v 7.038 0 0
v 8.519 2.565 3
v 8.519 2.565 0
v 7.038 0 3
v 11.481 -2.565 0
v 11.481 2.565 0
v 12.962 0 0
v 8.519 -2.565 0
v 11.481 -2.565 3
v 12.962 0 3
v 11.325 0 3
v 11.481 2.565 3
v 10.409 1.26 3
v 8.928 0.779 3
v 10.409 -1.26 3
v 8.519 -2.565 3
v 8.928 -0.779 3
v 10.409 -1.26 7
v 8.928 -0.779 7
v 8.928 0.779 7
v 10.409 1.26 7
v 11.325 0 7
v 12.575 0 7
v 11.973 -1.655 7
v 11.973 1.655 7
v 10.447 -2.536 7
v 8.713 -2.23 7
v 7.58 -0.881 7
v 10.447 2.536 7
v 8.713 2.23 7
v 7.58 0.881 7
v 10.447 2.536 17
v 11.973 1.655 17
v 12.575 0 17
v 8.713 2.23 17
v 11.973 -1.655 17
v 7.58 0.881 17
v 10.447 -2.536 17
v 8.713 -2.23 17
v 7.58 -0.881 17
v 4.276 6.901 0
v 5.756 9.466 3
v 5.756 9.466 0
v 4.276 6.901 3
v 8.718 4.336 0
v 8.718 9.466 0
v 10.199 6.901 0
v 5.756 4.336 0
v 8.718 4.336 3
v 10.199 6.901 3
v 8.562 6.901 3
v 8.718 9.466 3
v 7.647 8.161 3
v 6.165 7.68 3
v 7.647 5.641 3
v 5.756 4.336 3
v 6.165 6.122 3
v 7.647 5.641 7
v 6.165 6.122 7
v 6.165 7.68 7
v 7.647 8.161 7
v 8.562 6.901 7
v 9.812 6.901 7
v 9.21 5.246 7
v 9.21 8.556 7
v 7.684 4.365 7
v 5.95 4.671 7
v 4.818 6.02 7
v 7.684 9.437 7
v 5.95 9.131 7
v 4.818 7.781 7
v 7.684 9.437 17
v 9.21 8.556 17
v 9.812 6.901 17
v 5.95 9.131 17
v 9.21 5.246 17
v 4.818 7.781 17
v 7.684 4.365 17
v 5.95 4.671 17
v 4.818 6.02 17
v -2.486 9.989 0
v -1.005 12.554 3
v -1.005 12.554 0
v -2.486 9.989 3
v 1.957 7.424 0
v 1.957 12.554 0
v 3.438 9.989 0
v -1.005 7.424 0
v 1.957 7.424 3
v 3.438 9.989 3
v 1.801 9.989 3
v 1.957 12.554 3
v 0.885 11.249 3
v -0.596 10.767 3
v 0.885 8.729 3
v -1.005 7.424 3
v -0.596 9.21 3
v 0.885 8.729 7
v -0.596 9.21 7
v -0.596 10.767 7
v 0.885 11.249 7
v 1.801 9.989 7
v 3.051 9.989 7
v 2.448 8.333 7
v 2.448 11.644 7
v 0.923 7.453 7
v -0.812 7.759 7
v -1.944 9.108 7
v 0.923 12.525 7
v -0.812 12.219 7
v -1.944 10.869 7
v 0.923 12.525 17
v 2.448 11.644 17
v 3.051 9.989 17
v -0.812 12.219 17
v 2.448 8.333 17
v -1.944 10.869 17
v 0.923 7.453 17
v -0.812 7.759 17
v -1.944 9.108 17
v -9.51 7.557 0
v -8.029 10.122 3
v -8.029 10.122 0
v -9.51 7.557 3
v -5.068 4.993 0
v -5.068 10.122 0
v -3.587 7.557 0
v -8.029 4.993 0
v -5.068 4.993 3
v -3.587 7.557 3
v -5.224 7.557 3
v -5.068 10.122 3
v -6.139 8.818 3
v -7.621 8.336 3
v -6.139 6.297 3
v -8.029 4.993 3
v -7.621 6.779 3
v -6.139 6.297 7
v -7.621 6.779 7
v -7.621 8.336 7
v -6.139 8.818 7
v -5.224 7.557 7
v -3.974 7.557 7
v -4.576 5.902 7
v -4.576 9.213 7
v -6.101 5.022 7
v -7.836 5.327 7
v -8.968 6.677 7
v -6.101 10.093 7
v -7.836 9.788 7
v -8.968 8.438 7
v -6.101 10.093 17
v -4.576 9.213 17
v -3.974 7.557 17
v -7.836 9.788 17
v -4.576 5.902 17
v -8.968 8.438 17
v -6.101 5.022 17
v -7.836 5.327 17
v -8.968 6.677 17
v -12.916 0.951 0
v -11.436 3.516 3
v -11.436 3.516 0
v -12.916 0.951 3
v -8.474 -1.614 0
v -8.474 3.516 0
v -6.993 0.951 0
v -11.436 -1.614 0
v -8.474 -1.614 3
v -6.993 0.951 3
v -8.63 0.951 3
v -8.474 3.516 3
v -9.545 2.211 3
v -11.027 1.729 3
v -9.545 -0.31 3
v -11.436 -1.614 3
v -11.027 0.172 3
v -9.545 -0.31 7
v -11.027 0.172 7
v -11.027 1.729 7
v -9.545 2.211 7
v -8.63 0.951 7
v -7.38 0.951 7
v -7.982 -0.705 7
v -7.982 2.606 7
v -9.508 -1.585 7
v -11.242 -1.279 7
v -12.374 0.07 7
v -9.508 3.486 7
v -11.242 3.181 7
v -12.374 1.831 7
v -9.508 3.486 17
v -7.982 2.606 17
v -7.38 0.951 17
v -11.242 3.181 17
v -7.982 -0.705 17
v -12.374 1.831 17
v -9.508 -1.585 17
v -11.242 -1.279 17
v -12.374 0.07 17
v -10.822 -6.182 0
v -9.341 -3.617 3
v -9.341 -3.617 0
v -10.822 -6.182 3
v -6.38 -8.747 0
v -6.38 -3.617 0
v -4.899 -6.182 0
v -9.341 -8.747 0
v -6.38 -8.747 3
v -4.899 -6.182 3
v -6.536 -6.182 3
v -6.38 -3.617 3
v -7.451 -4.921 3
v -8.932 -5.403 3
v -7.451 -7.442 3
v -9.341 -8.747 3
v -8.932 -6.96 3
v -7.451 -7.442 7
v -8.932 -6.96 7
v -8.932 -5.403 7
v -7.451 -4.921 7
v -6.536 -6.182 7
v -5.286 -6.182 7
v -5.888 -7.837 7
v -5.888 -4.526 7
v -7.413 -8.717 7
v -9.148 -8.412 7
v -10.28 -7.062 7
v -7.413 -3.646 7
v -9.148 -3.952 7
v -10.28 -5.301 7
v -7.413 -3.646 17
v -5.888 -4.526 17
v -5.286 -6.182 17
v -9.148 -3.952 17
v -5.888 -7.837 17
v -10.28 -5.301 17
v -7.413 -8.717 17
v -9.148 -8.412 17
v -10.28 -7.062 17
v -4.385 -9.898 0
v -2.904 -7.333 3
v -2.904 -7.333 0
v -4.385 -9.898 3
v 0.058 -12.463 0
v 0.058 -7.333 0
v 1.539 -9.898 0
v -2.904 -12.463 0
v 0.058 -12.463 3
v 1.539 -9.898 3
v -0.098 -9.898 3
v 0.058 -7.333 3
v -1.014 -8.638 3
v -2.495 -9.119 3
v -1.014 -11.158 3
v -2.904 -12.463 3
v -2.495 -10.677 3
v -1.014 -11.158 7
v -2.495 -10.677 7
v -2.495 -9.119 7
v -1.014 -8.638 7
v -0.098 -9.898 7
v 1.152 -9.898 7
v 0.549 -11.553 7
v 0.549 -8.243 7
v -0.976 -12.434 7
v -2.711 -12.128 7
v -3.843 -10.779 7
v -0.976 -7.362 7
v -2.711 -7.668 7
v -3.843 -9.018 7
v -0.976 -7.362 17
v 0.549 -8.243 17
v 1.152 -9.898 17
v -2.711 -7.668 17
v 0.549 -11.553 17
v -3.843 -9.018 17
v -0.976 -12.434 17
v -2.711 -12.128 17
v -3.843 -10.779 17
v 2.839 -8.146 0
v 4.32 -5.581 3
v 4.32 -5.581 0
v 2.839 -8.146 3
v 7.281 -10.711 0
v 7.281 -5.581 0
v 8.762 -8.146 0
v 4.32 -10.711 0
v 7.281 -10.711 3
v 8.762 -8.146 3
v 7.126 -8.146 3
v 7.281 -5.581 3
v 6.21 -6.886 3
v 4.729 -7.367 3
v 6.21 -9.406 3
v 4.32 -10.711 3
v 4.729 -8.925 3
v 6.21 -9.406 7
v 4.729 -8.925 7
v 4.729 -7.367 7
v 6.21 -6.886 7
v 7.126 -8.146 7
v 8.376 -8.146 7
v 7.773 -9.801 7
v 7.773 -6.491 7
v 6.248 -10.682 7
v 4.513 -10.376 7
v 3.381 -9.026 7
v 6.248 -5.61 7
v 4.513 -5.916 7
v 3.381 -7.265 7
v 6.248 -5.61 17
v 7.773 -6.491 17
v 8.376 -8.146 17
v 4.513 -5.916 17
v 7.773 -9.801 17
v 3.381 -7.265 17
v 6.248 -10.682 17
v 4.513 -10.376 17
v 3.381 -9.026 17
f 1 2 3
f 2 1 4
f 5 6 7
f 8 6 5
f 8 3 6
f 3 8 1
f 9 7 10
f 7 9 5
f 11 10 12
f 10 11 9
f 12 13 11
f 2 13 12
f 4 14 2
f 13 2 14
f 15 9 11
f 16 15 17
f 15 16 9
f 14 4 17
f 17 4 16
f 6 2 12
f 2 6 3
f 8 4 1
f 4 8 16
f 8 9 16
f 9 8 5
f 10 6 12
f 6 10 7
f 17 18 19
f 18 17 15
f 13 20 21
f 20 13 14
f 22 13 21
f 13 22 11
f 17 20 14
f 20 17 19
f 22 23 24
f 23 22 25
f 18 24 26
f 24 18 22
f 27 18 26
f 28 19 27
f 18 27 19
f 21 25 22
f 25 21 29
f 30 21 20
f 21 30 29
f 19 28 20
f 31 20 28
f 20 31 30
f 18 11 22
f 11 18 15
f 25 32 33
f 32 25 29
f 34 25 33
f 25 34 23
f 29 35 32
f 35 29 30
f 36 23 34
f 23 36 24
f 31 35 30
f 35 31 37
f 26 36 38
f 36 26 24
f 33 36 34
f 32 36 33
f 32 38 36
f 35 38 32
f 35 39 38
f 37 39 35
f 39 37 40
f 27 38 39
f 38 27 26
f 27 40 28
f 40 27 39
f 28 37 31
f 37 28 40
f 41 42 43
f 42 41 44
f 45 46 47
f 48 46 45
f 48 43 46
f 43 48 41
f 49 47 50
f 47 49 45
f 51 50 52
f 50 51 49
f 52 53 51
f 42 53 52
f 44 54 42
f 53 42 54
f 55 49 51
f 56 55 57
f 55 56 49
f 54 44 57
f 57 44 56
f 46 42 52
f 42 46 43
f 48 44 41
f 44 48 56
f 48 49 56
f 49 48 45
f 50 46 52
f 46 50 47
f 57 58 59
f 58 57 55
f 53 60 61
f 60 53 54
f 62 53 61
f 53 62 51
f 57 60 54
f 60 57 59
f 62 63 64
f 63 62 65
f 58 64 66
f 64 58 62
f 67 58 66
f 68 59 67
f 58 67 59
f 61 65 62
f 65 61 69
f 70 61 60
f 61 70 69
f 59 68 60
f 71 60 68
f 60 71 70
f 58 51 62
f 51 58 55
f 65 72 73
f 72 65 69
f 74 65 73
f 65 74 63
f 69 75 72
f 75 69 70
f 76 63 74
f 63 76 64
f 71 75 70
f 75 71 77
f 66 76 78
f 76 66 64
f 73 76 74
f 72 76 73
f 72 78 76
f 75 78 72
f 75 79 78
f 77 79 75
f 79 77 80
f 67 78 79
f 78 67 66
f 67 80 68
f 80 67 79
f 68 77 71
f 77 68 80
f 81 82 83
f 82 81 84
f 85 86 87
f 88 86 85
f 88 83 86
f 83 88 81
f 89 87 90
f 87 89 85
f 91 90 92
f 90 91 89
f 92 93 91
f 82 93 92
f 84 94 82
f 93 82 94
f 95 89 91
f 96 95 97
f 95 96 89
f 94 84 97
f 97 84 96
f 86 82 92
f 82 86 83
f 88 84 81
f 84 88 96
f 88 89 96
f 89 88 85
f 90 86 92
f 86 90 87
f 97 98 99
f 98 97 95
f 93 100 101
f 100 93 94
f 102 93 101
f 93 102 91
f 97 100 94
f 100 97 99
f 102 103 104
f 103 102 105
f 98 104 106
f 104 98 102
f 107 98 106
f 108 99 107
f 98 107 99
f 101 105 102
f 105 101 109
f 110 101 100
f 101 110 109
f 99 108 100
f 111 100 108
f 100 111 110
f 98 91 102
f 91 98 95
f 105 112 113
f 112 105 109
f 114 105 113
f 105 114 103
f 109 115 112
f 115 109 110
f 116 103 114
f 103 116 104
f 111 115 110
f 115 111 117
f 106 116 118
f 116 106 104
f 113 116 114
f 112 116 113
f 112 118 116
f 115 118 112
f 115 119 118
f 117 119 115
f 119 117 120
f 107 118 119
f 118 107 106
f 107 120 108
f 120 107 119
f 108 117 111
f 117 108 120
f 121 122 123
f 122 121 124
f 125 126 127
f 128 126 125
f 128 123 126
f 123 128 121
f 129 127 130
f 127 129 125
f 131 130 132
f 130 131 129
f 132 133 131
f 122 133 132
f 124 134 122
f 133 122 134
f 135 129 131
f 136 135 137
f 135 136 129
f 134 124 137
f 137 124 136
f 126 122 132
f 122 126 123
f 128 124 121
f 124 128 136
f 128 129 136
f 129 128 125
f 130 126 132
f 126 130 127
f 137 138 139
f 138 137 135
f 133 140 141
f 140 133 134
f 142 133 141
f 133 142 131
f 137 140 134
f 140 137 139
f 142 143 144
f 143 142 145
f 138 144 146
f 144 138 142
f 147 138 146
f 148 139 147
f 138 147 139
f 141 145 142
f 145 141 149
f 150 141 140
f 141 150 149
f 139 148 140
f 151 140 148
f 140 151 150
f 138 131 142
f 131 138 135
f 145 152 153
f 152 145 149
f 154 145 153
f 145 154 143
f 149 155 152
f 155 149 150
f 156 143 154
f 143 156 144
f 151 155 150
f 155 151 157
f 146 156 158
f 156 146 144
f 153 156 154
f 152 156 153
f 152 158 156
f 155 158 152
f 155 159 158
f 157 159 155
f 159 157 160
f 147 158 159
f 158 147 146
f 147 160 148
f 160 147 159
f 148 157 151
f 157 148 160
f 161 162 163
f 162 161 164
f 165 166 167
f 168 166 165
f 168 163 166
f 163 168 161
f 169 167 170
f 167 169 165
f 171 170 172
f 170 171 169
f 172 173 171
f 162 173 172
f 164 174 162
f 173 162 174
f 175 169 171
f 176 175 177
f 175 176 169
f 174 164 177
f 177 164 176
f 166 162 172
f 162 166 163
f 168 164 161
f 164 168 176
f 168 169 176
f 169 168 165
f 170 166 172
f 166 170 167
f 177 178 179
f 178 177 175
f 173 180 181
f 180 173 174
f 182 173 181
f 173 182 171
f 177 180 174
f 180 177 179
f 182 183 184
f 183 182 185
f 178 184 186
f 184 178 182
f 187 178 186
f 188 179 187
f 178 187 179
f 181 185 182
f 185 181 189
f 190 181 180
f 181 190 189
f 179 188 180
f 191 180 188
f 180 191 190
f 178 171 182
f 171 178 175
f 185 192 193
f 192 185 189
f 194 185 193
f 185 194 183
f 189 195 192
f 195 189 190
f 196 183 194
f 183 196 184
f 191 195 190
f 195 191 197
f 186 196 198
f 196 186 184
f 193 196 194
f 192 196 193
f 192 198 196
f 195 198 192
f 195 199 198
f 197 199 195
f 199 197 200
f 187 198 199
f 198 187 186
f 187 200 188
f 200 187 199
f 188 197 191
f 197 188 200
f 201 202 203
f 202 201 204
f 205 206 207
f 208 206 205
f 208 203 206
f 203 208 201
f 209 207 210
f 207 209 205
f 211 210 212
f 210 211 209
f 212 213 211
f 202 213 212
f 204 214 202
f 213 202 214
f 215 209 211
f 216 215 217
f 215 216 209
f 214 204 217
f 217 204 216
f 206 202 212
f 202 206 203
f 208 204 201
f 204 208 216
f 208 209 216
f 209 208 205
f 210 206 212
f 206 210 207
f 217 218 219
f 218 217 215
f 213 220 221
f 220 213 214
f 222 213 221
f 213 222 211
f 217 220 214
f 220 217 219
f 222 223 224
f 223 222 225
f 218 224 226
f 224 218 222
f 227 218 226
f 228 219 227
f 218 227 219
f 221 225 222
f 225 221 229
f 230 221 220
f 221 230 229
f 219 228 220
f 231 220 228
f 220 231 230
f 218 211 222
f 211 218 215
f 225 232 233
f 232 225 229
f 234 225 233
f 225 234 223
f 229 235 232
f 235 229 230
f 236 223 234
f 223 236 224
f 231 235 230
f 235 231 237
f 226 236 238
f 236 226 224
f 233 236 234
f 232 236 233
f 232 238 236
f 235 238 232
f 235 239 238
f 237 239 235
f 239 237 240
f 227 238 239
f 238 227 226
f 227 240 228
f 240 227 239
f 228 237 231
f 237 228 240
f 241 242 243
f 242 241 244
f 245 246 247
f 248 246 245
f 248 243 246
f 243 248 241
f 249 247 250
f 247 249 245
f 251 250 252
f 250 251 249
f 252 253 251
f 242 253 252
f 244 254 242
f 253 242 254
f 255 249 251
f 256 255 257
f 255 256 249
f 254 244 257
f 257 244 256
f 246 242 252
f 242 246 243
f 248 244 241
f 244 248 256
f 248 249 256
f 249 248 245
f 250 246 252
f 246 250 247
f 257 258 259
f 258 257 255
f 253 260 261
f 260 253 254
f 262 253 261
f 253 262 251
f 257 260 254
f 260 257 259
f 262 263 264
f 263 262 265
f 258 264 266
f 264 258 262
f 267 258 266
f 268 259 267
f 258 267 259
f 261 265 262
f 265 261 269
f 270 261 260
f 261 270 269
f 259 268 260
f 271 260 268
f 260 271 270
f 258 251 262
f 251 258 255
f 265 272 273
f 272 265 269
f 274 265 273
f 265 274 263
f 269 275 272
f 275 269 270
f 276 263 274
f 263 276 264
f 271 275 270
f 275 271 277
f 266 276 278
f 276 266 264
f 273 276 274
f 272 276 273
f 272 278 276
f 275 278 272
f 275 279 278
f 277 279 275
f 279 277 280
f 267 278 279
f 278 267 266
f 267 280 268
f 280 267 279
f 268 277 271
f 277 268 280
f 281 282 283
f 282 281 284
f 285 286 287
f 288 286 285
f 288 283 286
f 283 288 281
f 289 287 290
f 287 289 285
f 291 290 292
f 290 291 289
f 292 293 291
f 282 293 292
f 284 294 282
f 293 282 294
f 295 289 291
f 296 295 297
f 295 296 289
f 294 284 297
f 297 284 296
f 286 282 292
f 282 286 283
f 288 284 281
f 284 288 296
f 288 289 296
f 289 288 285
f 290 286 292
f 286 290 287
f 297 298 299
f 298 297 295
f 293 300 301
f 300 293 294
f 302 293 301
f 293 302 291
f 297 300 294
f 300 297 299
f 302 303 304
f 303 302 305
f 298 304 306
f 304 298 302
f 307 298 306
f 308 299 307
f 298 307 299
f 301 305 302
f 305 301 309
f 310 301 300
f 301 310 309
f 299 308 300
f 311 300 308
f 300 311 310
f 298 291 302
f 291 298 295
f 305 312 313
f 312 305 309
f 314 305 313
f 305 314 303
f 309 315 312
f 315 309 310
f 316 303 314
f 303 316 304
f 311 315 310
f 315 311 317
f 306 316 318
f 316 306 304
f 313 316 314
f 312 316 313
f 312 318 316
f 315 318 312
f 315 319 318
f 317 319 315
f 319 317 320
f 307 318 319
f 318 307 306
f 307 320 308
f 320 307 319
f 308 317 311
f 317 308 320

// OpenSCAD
//translate([10, 10, 0]) boltHole();
boltHoles(num = 8, r = 10, z= 0, boltDiameter = 2.5, nutSink = 3, gap = 4, headSink = 10, accuracy = 0.15);

//boltHoles(num = 4, r = 5, z= 0, boltDiameter = 2.5, nutSink = 3, gap = 4, headSink = 10, accuracy = 0.15);

/*
translate([2, 2, 0]) cylinder(20, 0.5);
translate([5, 5, 0]) boltHole(boltDiameter = 2.5, nutSink = 3, gap = 4, headSink = 10, accuracy = 0.0);

translate([5, -5, 0]) boltHole(boltDiameter = 2.5, nutSink = 3, gap = 4, headSink = 10, accuracy = 0.075);

translate([-5, -5, 0]) boltHole(boltDiameter = 2.5, nutSink = 3, gap = 4, headSink = 10, accuracy = 0.15);

translate([-5, 5, 0]) boltHole(boltDiameter = 2.5, nutSink = 3, gap = 4, headSink = 10, accuracy = 0.225);
*/

// Simple list comprehension for creating N-gon vertices (from
// built-in FreeCad examples
function ngon(num, r) = 
  [for (i=[0:num-1], a=i*360/num) [ r*cos(a), r*sin(a) ]];

module boltHole(boltDiameter = 2.5, nutSink = 3, gap = 4, headSink = 10, accuracy = 0.15) {
  holeRadius = boltDiameter / 2;
  headRadius = 2 * holeRadius;
  nutRadius = 2 * holeRadius / cos(30);
      
  nutDrill = nutRadius + accuracy / 2;
  linear_extrude(height = nutSink) translate([0,0,0]) polygon(ngon(6, nutDrill));

  holeDrill = holeRadius + accuracy / 2;
  translate([0,0, nutSink]) { cylinder(h = gap, r1 = holeDrill, r2 = holeDrill, center = false); }

  headDrill = headRadius + accuracy / 2;
  translate([0,0,nutSink + gap]) { cylinder(h = headSink, r1 = headDrill, r2 = headDrill, center = false); }

}

module boltHoles(num = 1, r = 0, z= 0, boltDiameter = 2.5, nutSink = 3, gap = 4, headSink = 10, accuracy = 0.15) {
    for (i=[0:num-1], a=i*360/(num + 2 / num)) {
        translate([r * cos(a), r * sin(a), z]) boltHole(boltDiameter, nutSink, gap, headSink, accuracy);
    }
}
